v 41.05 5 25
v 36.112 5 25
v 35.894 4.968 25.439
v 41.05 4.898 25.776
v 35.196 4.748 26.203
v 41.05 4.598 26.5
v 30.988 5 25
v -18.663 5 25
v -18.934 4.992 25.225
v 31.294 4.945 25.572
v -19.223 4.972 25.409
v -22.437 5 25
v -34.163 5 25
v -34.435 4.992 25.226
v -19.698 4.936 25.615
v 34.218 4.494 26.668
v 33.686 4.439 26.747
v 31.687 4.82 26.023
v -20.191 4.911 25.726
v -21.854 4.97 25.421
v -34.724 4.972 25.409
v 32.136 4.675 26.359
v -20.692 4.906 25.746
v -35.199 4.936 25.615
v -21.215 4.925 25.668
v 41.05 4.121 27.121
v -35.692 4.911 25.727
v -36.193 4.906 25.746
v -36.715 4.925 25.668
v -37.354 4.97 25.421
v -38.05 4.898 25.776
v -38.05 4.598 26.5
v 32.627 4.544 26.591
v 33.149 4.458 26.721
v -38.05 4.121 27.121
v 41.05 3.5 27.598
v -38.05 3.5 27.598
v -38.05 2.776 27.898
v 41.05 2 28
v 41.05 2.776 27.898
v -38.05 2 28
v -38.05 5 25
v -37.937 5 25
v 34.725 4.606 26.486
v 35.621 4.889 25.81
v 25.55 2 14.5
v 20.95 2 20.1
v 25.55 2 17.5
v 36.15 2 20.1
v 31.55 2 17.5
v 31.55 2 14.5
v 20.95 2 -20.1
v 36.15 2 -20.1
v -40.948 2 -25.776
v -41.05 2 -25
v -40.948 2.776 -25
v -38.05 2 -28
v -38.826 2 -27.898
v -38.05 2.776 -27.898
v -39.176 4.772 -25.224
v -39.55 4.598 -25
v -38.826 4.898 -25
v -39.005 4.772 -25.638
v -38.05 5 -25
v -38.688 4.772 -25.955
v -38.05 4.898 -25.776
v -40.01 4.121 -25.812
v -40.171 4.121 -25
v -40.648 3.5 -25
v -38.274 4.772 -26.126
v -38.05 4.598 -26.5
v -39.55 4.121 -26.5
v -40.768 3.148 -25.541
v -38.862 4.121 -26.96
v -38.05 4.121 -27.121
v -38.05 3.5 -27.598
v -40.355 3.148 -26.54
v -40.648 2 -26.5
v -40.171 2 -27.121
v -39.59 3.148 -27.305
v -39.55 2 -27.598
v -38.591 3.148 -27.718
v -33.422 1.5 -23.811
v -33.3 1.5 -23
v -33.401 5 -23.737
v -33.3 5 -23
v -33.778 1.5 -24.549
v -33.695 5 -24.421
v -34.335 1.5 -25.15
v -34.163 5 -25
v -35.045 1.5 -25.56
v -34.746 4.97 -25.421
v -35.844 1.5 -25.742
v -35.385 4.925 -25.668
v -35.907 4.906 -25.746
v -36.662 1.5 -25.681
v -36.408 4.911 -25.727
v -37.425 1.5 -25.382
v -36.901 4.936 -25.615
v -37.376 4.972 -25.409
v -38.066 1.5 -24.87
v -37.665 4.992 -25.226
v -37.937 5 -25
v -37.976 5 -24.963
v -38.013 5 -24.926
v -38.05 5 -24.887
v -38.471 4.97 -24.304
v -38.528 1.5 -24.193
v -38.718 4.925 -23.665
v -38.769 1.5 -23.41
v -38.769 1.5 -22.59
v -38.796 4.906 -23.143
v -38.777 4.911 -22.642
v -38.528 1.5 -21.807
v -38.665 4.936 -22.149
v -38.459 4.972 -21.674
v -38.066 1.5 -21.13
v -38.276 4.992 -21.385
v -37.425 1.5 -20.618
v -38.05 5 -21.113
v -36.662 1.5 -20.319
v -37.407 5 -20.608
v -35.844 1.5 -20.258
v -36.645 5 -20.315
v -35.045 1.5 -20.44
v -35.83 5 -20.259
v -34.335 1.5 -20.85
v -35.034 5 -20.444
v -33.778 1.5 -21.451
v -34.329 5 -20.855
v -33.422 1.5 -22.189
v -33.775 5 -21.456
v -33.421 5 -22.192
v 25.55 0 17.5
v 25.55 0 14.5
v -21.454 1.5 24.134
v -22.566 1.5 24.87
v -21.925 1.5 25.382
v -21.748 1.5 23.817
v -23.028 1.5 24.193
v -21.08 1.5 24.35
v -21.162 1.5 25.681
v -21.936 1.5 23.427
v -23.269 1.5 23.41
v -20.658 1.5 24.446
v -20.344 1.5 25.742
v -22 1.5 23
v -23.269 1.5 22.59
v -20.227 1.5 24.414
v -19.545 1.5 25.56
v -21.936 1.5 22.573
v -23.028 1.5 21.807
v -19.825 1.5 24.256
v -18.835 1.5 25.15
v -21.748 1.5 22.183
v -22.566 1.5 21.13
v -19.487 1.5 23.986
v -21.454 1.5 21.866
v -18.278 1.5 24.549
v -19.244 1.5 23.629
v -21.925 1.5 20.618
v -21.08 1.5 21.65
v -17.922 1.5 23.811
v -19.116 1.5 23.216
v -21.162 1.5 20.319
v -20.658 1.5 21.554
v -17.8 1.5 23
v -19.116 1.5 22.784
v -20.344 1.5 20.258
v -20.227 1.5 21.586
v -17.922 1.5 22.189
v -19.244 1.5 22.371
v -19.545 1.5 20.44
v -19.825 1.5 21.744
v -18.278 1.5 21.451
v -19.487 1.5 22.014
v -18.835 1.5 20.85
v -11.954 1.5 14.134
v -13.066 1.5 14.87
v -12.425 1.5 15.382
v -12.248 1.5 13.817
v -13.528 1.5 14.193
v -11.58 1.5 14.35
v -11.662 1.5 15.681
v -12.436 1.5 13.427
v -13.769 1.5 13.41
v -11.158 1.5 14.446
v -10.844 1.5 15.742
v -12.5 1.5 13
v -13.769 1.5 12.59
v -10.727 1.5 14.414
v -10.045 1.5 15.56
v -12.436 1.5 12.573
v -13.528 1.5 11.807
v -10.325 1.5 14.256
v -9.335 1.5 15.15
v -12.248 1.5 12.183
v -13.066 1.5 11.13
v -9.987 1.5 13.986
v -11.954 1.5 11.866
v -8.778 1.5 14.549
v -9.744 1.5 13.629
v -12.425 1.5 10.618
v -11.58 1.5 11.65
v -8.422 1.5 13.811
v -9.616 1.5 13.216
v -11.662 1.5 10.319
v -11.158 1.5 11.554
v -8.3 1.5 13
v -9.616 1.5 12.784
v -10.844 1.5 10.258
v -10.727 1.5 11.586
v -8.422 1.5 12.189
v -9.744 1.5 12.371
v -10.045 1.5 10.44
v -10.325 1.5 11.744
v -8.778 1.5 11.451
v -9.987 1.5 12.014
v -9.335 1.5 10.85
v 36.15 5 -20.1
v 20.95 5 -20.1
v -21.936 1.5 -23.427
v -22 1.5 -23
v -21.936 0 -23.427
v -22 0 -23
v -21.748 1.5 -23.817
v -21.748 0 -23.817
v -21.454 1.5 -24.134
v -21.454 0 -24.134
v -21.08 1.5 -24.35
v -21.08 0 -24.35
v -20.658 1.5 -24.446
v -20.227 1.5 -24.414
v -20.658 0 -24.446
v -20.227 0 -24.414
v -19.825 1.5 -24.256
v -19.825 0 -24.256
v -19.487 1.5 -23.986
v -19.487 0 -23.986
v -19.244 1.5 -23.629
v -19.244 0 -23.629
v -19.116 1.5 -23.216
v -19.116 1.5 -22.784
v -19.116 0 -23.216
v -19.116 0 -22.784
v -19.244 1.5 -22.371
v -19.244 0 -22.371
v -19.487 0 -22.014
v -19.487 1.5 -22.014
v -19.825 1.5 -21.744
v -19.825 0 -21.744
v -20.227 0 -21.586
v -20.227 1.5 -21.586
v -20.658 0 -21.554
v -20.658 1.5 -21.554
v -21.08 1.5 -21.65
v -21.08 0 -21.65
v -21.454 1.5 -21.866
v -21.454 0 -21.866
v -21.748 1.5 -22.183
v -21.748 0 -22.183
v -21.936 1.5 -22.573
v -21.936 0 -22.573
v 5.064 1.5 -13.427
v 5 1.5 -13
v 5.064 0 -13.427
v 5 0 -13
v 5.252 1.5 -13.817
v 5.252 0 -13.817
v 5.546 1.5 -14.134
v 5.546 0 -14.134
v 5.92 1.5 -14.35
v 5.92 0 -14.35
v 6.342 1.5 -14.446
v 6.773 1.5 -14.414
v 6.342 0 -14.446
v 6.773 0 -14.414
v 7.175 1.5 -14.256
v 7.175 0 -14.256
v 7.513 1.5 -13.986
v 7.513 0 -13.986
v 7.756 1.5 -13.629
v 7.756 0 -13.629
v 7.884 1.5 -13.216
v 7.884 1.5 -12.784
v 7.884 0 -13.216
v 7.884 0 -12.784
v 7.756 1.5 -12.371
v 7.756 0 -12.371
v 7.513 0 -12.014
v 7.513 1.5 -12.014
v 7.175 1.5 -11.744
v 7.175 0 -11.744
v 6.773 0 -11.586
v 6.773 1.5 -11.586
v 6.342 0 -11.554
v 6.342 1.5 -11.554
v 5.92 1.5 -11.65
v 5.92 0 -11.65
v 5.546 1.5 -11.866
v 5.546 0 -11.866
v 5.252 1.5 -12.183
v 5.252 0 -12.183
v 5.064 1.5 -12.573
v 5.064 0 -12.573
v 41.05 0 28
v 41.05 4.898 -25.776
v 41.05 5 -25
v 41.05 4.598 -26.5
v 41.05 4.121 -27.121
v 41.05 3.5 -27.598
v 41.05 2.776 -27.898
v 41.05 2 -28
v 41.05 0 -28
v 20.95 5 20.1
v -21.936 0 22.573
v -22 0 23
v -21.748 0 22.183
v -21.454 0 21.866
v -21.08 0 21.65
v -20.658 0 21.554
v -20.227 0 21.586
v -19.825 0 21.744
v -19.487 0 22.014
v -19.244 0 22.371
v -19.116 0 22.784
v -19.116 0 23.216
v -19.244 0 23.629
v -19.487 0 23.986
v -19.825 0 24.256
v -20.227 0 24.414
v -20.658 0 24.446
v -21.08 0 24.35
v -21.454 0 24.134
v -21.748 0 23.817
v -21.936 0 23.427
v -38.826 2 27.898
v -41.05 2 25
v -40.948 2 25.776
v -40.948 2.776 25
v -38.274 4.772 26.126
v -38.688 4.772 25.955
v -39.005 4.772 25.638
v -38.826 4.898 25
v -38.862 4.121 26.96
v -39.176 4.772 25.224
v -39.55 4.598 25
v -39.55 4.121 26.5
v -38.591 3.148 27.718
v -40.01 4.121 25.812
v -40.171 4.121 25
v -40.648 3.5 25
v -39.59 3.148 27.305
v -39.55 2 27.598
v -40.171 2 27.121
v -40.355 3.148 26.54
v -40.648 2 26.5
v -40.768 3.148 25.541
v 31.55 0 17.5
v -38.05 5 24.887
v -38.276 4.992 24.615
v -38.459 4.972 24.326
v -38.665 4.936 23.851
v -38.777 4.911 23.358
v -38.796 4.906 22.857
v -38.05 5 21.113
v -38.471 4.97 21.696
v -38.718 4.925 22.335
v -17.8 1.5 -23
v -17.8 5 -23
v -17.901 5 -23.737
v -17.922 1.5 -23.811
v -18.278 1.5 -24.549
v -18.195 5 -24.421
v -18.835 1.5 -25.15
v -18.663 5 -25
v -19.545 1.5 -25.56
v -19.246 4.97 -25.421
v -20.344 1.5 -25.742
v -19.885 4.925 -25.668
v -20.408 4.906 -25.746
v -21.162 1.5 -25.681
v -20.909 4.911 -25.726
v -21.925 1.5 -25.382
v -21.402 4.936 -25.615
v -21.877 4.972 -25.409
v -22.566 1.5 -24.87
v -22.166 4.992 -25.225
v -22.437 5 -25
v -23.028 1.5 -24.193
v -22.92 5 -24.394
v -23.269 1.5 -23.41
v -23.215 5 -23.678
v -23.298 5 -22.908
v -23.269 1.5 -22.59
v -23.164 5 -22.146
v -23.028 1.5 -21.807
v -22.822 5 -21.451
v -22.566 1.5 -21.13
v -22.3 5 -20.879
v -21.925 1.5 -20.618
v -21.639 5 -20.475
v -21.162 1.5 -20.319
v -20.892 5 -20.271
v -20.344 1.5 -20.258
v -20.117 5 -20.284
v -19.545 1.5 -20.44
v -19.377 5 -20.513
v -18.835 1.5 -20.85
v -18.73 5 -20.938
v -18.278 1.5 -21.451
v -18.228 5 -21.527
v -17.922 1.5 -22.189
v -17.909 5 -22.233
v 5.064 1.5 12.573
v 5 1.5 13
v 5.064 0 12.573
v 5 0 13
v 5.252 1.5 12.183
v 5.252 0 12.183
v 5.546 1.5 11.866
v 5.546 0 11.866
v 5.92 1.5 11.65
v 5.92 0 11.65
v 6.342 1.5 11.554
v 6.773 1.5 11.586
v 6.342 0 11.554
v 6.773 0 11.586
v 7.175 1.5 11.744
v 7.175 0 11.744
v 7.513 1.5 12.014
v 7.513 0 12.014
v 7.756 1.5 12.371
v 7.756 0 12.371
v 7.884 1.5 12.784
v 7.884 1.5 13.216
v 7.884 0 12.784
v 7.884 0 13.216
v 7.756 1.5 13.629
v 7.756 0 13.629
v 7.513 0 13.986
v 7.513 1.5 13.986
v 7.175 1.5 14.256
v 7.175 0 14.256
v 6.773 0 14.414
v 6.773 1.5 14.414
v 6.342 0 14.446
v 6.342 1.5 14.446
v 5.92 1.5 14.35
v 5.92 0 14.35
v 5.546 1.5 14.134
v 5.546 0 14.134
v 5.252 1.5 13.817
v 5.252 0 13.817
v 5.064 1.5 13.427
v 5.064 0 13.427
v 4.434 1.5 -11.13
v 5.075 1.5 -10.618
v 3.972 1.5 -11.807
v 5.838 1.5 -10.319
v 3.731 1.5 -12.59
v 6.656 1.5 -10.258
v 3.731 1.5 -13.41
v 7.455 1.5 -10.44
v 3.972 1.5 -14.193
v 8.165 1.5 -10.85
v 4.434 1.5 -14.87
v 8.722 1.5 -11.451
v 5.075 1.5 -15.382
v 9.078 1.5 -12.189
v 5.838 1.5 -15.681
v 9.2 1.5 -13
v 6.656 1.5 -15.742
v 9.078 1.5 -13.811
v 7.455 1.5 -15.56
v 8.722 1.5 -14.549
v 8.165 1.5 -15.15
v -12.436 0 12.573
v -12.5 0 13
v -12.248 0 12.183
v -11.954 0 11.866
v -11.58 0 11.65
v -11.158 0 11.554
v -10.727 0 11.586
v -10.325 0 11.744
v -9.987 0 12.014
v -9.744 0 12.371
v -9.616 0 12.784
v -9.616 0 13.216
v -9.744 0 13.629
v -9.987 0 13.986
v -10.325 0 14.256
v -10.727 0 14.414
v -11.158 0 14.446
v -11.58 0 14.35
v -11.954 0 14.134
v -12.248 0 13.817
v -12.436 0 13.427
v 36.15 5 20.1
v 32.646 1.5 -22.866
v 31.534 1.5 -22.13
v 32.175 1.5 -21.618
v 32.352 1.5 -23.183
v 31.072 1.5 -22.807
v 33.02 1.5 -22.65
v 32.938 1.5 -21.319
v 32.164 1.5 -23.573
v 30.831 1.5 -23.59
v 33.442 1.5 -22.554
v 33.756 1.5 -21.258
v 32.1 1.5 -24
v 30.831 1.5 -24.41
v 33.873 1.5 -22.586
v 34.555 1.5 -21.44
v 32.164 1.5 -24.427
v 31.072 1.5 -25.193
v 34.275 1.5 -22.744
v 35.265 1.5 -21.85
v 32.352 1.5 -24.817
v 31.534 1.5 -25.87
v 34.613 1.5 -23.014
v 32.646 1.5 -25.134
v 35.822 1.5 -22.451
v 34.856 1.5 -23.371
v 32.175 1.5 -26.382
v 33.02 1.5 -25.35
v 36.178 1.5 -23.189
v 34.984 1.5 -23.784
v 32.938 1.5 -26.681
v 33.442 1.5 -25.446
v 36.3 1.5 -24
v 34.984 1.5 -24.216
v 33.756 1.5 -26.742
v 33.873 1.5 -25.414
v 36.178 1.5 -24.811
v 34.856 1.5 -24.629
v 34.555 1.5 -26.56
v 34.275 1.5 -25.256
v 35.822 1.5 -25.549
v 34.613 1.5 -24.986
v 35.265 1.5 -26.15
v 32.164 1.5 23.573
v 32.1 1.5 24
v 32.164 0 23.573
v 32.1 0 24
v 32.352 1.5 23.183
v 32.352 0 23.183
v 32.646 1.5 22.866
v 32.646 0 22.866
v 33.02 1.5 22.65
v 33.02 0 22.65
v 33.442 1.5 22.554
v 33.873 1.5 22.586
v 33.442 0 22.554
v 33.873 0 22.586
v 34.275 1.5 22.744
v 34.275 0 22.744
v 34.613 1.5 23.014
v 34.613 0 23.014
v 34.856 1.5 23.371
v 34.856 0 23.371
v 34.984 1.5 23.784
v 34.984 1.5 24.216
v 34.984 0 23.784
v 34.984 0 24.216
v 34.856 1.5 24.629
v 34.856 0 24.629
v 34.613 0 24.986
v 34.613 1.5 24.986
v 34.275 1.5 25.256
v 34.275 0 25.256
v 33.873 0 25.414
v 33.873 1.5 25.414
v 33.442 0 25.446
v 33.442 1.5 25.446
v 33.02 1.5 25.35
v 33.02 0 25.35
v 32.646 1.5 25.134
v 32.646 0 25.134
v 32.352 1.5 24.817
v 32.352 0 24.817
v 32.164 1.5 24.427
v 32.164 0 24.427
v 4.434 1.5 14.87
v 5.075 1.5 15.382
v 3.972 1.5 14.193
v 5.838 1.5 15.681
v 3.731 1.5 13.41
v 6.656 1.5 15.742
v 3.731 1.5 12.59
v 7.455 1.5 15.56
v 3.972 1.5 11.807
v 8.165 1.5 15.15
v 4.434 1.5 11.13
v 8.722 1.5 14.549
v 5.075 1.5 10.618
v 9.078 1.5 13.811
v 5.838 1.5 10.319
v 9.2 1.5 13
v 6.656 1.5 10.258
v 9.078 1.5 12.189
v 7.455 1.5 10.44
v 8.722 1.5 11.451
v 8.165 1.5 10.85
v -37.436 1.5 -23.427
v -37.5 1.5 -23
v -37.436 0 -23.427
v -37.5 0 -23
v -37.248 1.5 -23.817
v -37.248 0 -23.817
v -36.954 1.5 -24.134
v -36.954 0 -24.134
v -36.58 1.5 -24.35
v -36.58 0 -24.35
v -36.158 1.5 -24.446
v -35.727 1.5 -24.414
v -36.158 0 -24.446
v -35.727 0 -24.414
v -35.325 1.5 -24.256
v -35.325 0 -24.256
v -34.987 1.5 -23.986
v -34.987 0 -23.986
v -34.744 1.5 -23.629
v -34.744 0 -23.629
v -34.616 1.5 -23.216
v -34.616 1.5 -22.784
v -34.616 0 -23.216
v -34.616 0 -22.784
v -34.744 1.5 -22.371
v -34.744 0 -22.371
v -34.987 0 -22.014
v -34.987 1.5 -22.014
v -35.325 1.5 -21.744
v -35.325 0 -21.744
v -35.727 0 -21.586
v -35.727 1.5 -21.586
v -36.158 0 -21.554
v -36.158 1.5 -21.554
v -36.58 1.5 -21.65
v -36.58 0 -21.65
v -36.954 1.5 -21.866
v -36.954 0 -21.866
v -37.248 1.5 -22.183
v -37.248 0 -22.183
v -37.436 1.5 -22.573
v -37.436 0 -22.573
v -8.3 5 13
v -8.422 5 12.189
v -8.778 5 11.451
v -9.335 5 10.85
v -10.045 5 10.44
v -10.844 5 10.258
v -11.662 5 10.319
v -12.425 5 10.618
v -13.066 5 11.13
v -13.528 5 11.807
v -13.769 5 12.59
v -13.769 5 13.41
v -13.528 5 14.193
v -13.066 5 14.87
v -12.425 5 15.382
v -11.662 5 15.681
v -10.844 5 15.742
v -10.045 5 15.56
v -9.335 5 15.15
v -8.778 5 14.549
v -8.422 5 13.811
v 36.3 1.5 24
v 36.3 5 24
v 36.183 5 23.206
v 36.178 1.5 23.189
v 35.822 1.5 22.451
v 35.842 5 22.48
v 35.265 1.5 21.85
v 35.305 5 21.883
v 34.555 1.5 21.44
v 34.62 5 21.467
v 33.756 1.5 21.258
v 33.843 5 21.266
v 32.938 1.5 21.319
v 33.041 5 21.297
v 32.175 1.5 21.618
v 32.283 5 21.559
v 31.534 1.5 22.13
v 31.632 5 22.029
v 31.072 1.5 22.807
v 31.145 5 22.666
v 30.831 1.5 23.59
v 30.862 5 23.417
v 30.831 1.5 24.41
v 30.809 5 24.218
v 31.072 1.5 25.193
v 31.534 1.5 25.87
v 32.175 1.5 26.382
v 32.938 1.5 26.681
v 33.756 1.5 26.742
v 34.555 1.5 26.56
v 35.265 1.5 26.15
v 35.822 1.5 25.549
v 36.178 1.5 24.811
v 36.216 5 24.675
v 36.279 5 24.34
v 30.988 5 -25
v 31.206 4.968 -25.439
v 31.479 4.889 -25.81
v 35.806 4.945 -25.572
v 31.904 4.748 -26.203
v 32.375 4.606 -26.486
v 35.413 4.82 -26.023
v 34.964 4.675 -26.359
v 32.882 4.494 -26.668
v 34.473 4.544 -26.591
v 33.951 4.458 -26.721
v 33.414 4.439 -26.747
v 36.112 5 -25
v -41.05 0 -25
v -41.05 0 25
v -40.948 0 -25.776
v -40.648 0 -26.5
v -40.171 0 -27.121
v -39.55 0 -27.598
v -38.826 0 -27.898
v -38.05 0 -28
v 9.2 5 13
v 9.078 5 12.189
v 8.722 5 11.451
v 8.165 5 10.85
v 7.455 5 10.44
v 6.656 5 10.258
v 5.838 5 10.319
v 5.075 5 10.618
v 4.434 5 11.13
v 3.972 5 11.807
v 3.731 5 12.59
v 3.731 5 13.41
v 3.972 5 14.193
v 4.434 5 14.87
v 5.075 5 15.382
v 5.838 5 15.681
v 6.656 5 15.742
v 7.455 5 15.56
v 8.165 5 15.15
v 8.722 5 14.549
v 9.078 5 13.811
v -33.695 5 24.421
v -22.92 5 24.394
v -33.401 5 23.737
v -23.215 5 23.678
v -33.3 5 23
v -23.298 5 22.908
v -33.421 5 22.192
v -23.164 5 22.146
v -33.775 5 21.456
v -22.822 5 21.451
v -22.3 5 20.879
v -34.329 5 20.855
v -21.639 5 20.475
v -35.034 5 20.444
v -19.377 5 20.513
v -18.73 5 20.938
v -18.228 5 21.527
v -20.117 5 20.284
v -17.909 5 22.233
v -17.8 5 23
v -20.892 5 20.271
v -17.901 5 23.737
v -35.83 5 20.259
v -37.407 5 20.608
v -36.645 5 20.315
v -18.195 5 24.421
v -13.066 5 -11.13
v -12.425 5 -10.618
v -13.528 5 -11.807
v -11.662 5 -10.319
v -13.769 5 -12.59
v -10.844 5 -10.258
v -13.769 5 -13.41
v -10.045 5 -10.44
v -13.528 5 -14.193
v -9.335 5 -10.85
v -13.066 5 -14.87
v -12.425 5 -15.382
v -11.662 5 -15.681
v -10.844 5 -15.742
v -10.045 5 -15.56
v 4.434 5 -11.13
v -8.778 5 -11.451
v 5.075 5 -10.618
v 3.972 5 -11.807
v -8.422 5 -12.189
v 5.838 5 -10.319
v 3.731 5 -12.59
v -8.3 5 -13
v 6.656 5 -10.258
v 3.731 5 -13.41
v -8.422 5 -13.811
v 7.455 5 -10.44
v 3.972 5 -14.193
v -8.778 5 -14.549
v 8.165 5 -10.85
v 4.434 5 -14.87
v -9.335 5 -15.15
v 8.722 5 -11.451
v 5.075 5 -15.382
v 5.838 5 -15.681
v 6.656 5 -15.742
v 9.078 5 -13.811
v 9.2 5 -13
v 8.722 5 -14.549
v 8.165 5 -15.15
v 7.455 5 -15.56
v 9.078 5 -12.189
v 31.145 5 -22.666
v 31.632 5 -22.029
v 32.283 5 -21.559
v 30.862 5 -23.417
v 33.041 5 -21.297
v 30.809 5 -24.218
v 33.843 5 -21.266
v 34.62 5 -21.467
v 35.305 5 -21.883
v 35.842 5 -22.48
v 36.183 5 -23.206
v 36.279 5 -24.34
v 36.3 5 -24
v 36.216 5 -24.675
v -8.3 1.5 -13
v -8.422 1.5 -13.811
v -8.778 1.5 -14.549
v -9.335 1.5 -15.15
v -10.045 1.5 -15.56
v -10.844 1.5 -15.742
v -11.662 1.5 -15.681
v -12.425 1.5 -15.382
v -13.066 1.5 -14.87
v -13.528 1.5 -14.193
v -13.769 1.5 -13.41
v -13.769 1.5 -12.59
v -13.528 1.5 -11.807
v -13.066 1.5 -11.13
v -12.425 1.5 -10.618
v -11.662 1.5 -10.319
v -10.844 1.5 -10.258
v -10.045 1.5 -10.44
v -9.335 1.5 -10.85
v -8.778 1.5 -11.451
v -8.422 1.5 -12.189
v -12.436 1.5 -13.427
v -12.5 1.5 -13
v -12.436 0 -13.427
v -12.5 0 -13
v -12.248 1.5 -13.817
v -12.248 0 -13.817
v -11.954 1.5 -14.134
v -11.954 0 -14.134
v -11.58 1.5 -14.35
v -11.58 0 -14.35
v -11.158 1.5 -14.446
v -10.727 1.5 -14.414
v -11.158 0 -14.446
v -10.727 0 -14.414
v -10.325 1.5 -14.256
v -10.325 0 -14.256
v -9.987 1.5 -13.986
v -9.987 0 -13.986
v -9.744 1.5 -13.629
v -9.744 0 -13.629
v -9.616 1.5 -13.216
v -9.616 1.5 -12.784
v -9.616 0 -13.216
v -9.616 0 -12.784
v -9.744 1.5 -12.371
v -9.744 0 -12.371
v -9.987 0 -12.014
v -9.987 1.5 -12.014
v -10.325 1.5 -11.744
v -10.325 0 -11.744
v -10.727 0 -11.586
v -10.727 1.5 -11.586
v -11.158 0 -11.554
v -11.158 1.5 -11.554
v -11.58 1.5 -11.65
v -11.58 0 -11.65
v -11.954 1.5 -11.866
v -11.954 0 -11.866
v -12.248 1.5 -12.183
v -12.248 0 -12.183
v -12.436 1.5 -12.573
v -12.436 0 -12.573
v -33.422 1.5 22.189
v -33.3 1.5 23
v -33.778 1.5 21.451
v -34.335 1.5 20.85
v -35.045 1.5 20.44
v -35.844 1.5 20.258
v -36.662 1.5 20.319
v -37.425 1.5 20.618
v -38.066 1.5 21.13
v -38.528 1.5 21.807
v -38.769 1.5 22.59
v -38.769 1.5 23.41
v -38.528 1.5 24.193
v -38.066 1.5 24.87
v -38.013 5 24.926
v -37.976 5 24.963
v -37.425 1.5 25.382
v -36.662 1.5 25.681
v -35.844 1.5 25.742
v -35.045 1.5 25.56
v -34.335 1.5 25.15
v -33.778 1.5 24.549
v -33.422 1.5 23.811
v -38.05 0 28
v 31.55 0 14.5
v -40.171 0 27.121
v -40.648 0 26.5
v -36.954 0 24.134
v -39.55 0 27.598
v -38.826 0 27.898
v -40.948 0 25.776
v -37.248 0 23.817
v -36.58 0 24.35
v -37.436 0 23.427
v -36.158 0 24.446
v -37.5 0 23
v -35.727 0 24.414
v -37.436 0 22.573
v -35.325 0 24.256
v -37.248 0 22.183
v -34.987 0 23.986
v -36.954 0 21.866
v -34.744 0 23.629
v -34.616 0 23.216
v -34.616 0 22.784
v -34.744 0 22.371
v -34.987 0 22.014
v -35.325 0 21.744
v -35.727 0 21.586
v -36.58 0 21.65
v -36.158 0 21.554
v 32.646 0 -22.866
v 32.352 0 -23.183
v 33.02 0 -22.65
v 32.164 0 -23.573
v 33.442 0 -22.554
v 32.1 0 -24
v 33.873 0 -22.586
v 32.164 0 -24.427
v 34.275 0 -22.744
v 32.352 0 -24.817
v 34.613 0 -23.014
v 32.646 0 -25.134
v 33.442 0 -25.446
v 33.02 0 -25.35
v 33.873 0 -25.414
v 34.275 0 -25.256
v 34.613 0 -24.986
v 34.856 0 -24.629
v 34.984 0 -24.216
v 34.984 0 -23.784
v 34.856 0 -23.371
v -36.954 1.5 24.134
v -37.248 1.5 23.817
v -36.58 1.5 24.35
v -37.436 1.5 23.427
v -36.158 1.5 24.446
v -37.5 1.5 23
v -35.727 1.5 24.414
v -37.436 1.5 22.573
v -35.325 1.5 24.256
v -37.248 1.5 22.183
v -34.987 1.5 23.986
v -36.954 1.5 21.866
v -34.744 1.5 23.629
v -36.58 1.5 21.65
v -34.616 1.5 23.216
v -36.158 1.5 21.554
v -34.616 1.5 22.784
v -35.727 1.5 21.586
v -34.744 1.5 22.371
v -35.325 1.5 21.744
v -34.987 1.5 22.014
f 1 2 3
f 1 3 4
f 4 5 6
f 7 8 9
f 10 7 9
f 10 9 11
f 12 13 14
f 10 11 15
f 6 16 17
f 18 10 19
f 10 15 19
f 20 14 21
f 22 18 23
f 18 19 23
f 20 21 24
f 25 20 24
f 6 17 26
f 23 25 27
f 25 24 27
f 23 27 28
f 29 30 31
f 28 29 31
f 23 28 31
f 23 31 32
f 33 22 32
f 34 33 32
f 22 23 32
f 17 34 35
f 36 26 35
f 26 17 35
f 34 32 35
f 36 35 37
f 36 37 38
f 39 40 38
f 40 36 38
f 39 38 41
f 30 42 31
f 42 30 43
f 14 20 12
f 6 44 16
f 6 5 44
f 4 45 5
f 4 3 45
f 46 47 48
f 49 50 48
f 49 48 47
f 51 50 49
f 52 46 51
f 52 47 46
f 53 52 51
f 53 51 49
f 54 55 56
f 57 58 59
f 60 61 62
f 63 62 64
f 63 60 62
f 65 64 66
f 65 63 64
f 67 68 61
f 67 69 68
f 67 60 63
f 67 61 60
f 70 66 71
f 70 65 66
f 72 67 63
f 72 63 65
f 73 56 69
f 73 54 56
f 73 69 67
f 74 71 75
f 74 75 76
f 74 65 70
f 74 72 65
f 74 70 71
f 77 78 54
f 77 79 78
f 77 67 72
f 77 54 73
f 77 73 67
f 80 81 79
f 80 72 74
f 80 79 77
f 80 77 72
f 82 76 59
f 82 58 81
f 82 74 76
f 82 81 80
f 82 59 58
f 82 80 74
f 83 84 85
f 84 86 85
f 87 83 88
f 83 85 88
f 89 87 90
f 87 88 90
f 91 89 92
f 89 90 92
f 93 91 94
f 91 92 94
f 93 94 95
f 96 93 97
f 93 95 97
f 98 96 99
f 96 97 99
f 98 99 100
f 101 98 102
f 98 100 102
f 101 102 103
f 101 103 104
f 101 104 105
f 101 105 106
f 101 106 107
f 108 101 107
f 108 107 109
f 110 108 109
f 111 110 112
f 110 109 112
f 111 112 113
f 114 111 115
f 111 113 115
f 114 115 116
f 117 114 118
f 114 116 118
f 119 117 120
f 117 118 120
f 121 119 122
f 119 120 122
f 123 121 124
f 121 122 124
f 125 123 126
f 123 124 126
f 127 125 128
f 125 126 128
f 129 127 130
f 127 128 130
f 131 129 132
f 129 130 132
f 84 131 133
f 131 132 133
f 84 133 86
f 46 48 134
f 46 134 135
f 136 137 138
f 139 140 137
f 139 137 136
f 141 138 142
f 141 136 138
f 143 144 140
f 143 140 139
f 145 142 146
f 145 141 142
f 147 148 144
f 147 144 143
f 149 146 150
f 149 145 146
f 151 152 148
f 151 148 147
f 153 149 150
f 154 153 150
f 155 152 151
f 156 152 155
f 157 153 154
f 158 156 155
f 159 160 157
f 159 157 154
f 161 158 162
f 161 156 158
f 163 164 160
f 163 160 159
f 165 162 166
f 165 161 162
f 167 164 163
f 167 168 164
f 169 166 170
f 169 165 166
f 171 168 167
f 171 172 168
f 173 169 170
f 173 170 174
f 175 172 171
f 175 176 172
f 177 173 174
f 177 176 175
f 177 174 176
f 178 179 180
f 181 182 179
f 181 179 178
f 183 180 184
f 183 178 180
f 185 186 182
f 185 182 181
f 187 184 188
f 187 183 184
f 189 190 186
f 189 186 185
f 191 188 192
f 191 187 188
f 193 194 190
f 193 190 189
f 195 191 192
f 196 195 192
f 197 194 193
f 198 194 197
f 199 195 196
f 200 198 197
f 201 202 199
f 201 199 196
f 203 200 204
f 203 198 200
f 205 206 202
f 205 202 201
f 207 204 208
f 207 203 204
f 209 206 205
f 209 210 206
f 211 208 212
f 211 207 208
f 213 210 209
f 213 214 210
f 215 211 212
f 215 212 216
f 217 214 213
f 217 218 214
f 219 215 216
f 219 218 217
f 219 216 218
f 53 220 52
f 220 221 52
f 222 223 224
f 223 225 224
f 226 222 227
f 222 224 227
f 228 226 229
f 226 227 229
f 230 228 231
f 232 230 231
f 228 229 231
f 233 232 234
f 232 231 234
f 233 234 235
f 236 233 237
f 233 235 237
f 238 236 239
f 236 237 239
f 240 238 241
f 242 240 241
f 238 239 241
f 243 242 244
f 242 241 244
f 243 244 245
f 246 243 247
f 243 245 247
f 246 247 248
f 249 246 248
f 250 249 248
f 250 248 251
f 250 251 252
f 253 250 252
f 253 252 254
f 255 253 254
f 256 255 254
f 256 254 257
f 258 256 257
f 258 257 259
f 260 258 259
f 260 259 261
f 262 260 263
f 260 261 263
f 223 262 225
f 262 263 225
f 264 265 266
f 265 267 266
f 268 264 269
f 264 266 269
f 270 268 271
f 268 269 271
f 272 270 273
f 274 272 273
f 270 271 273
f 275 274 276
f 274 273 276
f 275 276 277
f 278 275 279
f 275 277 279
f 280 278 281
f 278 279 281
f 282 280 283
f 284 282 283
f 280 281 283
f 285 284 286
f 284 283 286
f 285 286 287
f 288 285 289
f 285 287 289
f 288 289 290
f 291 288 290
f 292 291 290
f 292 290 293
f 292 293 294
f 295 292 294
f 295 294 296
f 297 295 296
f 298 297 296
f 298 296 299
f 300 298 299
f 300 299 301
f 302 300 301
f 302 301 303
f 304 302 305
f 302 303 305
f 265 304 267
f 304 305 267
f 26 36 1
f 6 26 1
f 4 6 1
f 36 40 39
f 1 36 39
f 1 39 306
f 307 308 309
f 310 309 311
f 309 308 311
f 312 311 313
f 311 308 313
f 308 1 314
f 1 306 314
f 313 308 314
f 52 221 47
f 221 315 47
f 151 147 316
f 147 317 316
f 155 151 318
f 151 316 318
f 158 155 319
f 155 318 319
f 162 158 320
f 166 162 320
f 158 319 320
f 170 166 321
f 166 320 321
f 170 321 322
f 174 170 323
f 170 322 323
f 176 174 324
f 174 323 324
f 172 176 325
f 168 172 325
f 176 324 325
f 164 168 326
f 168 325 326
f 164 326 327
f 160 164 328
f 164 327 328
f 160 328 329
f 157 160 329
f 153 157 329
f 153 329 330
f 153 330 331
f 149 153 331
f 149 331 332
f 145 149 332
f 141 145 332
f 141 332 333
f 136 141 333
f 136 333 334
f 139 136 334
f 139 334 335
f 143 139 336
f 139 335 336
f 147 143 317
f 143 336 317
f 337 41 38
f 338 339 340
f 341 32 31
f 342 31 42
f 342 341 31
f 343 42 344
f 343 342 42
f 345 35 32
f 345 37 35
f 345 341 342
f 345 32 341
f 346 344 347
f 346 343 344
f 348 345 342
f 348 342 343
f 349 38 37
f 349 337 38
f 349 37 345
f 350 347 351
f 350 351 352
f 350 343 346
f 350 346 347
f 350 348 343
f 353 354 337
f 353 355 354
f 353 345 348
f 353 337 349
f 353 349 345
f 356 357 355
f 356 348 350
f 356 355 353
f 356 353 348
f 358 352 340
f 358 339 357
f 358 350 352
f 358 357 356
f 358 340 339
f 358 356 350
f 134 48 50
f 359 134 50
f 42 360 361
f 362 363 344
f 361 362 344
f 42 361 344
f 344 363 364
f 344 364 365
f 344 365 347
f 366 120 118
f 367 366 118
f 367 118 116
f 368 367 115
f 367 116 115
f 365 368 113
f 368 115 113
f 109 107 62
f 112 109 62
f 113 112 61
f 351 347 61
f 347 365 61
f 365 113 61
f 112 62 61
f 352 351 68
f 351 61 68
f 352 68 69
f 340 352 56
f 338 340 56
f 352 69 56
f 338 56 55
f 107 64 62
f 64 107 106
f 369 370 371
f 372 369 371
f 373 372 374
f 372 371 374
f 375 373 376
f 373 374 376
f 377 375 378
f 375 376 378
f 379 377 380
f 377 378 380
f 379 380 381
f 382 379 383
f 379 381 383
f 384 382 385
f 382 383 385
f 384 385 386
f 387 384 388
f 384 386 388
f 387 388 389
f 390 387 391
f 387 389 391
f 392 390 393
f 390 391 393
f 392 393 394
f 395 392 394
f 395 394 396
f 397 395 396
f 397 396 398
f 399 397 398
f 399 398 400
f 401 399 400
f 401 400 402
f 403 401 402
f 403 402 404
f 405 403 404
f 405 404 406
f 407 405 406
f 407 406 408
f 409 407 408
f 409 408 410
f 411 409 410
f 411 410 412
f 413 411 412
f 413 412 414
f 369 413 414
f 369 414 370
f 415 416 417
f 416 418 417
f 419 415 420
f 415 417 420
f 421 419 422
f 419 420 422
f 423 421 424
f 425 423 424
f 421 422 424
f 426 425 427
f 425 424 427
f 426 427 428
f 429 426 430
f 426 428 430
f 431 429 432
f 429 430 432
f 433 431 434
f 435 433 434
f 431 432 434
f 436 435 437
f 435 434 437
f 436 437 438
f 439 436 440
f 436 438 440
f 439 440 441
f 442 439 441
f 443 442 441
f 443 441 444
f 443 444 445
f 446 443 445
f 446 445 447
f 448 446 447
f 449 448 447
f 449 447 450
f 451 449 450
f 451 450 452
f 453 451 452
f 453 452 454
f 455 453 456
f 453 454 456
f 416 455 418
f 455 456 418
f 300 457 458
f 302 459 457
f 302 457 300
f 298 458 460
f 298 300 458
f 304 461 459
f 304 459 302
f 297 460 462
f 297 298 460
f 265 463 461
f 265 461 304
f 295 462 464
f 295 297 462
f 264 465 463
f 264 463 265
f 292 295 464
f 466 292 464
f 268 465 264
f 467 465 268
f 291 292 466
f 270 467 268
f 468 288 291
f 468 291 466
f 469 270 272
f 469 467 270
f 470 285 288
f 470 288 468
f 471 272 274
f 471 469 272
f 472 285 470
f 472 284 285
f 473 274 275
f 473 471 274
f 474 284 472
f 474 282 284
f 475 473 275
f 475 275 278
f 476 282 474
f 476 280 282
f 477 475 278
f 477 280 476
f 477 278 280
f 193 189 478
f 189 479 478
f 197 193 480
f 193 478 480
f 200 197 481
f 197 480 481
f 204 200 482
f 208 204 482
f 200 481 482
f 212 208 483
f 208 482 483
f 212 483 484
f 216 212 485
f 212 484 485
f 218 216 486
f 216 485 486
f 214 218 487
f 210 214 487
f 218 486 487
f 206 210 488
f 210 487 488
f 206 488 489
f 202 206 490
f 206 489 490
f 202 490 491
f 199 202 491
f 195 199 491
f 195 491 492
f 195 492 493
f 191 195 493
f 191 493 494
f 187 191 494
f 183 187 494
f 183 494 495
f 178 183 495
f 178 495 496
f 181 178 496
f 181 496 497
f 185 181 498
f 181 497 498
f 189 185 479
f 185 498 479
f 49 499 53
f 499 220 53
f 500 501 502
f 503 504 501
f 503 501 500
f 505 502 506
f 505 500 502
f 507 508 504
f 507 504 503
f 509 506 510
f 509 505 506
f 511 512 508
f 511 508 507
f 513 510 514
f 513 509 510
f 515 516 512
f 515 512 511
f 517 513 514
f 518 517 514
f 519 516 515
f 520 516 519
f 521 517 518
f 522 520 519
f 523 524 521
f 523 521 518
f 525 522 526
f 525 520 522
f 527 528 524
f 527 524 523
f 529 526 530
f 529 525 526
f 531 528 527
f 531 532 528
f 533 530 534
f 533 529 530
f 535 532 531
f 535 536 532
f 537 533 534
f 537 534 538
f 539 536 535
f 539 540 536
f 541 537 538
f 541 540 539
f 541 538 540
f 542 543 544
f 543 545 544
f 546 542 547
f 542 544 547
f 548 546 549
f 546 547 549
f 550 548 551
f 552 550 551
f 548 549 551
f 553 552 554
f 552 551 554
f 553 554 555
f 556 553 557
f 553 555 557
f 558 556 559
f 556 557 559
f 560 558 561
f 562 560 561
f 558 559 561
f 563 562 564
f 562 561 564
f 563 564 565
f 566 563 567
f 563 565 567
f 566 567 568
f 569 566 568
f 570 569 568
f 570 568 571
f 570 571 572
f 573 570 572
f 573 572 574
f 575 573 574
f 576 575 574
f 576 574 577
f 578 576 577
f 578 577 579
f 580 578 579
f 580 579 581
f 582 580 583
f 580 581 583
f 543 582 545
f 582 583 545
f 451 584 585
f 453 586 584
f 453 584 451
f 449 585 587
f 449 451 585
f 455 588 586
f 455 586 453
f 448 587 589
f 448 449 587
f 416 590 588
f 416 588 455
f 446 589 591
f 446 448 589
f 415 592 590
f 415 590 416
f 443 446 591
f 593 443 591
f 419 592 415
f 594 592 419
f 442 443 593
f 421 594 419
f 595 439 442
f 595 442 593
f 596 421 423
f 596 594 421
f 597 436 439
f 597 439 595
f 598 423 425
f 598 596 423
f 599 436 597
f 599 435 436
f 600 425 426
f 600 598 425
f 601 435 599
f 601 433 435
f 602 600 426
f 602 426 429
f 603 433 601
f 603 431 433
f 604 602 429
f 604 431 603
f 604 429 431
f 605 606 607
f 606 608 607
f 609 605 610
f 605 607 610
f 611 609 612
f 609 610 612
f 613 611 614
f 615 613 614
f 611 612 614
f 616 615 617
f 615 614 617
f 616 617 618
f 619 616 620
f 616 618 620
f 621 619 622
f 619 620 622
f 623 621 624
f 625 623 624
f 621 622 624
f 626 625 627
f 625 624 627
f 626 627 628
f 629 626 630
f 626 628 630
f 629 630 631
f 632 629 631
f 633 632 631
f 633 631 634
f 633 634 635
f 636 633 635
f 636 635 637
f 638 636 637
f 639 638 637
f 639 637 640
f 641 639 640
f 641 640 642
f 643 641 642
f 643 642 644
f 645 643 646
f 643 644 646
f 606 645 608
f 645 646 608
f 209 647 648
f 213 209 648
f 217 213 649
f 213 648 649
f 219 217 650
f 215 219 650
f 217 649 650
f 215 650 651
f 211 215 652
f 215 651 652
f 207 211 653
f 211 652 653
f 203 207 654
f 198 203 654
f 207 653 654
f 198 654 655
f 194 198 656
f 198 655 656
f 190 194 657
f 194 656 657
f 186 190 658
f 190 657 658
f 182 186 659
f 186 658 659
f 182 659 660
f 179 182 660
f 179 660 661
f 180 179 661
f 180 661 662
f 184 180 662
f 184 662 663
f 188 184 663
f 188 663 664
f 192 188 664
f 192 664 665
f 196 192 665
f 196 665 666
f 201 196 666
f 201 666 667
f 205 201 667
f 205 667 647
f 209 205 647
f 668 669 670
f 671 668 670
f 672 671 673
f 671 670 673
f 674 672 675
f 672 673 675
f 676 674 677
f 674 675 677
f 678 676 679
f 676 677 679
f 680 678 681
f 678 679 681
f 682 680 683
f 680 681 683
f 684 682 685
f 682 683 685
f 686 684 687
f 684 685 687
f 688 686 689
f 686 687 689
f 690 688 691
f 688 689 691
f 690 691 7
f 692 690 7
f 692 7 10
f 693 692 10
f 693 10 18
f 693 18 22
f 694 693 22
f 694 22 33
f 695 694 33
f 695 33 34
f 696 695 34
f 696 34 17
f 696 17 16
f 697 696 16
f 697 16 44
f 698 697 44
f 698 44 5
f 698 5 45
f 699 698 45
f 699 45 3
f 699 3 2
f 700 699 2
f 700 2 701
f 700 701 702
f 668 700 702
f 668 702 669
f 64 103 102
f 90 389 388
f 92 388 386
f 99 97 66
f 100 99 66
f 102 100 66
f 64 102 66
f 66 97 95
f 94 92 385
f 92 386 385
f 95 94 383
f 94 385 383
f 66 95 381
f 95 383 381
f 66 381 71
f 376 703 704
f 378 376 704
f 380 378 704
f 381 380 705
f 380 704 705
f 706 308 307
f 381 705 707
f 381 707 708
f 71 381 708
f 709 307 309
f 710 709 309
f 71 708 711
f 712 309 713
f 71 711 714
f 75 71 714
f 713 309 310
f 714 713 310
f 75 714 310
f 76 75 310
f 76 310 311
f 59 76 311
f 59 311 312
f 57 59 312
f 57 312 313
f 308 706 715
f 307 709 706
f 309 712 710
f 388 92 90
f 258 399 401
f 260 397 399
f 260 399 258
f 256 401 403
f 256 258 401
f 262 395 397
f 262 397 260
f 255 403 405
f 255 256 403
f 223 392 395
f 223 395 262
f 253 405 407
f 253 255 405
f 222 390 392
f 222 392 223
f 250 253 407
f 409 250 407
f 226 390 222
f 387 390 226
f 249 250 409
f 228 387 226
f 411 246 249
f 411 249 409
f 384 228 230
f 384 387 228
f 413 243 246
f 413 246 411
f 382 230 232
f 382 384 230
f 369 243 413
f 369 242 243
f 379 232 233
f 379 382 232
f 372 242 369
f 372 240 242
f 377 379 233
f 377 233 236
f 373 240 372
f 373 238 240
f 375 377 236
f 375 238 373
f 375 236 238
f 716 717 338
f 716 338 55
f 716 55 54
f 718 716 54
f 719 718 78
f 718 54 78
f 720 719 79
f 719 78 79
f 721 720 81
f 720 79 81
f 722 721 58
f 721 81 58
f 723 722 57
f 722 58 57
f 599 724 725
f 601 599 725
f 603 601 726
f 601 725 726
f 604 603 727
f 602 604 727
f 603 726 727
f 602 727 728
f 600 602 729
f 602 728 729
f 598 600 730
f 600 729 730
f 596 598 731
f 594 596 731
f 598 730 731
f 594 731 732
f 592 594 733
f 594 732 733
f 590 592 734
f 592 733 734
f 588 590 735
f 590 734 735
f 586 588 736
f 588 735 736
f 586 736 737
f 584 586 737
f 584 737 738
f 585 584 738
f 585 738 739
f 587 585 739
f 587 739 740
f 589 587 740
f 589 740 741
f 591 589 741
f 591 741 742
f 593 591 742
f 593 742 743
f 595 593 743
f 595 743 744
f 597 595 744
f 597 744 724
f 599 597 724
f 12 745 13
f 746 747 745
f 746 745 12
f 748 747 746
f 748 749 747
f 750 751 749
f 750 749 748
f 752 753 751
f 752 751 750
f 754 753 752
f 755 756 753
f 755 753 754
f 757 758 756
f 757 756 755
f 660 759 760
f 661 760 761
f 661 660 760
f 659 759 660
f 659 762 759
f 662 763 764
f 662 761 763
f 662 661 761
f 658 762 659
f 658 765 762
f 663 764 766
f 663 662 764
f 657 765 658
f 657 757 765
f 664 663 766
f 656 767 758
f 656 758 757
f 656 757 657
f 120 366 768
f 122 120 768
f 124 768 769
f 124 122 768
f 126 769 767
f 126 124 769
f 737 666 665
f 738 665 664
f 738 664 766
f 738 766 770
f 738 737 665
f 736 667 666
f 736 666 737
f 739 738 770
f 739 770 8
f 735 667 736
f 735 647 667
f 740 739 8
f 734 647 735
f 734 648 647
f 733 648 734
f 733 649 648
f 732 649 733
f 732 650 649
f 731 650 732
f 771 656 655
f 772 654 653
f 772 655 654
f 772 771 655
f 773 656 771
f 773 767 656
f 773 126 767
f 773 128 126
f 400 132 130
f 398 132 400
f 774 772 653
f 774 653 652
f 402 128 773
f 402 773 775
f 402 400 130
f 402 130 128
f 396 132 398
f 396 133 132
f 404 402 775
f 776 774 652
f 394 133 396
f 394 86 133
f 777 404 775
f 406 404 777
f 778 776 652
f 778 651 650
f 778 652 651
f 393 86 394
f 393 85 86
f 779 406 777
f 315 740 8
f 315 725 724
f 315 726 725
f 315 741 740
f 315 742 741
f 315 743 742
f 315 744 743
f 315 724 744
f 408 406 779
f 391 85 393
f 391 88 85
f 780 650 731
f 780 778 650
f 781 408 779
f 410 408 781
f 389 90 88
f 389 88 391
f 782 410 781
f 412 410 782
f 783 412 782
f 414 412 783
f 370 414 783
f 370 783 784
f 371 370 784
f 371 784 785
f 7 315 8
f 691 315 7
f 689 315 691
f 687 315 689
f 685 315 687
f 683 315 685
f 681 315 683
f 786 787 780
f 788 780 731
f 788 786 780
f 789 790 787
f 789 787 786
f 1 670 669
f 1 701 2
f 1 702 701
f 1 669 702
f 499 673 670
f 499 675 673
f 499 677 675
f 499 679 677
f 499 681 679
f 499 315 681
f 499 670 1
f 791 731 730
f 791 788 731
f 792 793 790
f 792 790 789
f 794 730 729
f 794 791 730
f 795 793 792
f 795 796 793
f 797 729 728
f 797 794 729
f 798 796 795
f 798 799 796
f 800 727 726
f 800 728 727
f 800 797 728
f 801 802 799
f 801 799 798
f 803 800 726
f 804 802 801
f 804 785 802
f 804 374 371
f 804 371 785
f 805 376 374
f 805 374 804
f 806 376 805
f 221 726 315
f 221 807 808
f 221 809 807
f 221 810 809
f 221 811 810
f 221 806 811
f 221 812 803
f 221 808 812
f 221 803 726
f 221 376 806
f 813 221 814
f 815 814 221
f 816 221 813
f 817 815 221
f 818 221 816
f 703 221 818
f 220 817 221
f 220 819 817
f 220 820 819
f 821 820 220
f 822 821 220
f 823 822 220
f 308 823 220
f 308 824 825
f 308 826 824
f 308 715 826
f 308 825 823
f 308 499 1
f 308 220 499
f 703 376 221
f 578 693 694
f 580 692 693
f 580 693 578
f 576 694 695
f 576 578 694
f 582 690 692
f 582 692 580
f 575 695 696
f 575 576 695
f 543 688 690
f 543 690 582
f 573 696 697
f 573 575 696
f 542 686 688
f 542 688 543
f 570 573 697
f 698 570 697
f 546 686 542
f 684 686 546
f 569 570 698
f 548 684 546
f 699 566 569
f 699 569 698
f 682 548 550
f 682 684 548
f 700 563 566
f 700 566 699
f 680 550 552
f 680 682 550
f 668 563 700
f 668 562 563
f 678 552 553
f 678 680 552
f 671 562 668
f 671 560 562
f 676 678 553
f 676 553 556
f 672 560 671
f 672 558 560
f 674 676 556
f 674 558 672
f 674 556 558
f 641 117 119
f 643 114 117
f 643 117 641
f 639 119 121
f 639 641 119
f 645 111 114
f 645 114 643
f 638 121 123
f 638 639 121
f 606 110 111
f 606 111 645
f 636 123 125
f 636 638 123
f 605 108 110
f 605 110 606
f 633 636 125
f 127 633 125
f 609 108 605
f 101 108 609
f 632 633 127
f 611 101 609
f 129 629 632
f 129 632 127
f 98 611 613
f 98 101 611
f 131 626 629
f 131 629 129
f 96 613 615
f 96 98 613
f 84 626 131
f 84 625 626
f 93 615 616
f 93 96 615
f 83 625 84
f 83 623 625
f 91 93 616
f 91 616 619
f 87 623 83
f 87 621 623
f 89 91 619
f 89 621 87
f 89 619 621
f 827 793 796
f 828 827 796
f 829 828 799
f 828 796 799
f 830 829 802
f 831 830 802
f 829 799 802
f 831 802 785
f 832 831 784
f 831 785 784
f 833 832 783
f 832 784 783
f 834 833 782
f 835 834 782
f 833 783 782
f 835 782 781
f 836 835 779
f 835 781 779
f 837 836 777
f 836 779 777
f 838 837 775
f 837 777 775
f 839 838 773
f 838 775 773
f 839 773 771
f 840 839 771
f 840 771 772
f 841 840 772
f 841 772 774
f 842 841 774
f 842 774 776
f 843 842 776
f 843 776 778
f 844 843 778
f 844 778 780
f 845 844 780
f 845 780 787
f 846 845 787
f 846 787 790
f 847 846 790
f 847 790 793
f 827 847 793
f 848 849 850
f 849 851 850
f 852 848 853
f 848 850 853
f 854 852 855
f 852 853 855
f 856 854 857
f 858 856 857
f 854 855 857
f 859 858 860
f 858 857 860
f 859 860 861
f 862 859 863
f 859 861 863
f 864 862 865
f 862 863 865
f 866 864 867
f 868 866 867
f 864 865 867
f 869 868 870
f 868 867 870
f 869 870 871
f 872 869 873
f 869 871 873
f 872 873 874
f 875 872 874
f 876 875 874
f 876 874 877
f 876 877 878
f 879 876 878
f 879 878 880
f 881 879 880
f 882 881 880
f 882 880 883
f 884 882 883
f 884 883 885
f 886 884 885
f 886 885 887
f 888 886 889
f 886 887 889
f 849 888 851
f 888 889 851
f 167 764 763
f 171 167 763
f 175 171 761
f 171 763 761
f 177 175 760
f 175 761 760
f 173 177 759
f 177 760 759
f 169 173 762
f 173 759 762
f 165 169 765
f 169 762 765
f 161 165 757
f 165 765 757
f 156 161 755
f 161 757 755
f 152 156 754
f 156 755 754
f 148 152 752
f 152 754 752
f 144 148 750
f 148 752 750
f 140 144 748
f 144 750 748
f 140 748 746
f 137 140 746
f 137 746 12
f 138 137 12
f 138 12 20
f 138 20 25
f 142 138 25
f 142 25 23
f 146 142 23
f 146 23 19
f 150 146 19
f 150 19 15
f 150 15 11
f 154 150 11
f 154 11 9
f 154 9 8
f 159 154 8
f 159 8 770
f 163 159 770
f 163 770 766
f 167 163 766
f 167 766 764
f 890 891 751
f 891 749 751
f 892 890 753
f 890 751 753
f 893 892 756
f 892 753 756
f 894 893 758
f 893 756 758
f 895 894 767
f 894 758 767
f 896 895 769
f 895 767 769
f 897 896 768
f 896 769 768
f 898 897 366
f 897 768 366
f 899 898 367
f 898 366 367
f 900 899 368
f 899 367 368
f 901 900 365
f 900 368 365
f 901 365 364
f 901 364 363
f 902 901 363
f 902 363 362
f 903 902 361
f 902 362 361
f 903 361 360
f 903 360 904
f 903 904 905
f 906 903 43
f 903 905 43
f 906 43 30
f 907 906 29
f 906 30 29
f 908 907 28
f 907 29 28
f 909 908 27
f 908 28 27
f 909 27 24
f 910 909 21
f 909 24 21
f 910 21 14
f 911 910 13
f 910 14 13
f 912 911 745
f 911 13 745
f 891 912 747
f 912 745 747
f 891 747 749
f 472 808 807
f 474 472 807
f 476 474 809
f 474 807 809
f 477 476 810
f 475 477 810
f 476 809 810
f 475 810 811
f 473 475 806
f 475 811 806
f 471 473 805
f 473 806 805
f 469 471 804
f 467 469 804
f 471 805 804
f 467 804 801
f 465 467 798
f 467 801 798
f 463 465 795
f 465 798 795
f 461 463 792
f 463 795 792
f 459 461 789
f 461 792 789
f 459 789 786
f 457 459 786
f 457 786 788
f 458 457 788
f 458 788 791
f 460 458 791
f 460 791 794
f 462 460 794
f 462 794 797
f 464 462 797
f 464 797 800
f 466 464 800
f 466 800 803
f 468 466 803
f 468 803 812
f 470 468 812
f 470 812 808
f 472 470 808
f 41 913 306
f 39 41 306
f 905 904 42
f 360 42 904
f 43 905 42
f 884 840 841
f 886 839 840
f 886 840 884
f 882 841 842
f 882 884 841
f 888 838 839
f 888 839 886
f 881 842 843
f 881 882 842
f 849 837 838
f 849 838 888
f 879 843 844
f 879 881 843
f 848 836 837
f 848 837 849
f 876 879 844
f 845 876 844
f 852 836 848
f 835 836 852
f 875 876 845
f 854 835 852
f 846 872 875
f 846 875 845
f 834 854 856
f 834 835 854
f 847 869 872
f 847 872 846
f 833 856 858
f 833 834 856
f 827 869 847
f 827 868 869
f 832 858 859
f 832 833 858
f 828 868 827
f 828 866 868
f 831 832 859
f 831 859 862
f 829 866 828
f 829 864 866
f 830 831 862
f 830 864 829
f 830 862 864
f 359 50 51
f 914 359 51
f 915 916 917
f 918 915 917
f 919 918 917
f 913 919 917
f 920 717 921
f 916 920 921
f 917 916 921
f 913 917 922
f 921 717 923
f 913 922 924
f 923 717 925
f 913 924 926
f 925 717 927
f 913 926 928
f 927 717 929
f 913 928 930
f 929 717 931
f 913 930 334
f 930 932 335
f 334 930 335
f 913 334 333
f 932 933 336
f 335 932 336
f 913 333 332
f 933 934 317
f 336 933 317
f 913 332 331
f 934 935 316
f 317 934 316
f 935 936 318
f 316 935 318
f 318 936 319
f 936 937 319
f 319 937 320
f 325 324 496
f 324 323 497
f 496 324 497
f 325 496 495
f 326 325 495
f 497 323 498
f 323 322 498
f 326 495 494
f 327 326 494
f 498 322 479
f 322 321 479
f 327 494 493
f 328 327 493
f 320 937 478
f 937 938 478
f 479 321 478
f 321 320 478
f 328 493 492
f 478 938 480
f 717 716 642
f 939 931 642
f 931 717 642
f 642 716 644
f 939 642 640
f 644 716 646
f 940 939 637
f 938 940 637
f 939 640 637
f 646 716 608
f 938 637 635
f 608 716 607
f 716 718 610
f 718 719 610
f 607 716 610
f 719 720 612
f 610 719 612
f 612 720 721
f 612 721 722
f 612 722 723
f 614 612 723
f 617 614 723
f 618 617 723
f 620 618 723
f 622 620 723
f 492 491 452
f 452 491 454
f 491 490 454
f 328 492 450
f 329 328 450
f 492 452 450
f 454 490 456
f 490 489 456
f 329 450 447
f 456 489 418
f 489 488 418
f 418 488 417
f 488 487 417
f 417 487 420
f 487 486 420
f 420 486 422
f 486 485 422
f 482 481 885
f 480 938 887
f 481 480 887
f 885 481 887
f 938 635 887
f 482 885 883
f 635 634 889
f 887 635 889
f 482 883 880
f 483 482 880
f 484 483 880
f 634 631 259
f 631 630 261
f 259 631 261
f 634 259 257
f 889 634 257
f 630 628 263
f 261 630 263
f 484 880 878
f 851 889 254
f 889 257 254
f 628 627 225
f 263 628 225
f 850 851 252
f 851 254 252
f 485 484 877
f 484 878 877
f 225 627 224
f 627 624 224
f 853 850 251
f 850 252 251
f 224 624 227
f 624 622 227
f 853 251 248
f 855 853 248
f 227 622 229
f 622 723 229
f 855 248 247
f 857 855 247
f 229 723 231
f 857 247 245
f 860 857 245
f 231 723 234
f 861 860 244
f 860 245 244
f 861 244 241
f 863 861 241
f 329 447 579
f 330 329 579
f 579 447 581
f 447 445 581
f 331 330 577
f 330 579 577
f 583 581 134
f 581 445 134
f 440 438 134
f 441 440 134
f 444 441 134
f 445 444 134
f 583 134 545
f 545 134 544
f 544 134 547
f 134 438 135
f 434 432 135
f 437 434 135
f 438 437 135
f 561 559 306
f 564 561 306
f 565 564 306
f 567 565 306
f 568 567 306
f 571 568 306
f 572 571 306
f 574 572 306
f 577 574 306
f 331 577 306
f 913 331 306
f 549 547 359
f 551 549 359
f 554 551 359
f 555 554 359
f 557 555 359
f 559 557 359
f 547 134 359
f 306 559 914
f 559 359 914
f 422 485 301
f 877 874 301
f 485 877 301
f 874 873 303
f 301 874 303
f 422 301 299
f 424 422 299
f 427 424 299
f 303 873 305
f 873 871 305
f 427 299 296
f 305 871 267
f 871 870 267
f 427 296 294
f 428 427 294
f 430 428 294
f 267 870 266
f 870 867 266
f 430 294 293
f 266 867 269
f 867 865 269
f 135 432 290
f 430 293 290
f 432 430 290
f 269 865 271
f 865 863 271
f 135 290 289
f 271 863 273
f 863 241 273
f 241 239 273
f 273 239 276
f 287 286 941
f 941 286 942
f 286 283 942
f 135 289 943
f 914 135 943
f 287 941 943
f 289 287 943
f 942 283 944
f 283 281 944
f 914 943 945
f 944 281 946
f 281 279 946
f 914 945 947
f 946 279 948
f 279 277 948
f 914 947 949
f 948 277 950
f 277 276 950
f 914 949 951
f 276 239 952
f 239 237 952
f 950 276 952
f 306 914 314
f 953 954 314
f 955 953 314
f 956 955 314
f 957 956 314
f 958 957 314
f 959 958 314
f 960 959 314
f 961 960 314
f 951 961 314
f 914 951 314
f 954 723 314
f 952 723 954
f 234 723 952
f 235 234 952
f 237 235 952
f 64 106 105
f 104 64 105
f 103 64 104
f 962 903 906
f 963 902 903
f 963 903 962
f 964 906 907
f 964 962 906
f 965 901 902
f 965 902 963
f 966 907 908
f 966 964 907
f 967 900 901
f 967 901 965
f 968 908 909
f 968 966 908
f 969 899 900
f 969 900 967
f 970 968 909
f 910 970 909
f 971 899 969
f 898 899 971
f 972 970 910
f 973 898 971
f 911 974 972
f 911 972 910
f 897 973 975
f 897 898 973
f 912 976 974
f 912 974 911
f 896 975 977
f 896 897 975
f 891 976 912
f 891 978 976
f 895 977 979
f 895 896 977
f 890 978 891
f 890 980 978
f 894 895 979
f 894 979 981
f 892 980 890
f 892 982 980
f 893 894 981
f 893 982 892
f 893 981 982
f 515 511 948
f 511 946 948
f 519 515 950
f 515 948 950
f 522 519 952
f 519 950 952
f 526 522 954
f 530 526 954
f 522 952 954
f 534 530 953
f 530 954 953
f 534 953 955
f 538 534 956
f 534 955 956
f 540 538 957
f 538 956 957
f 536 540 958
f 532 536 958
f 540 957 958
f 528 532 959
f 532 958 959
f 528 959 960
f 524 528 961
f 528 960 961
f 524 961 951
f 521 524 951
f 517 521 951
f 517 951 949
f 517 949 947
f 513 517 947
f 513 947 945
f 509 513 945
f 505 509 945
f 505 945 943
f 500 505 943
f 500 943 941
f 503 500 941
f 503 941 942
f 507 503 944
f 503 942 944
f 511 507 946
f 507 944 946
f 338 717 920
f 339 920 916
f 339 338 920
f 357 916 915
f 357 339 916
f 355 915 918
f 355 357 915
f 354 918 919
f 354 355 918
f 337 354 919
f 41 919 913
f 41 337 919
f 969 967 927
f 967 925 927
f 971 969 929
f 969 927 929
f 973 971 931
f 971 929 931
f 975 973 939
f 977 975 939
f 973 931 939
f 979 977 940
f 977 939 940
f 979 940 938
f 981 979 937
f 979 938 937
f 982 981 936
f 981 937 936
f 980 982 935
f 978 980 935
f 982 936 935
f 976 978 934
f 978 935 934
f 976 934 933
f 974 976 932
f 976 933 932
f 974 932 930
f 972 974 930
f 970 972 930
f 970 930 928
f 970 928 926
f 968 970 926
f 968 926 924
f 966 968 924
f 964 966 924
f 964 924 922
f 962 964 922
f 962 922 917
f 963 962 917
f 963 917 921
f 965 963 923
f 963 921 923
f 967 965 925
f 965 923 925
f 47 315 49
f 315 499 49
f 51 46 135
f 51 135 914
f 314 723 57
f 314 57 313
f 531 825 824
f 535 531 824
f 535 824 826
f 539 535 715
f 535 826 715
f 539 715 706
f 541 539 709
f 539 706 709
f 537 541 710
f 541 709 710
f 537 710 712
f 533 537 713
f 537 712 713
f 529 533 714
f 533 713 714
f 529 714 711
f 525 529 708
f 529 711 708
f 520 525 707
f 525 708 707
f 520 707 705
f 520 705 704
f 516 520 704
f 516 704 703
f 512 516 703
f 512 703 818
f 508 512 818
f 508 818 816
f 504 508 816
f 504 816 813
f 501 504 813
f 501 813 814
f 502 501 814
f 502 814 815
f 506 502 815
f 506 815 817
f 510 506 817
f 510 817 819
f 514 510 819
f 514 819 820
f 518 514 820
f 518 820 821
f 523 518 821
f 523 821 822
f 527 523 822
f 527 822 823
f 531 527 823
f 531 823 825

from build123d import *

# Parameters (mm, degrees)
SKETCH1_W                        = 82.1
SKETCH1_H                        = 56
BOSS_EXTRUDE1_DEPTH              = 5
CBORE_FOR_M2_5_SHCS1_D           = 2.9
CBORE_FOR_M2_5_SHCS1_CBORE_D     = 5.5
CBORE_FOR_M2_5_SHCS1_CBORE_DEPTH = 3.5
FILLET1_R                        = 3
FILLET2_R                        = 3
SKETCH4_W                        = 15
SKETCH4_H                        = 40
CUT_EXTRUDE1_DEPTH               = 3
SKETCH5_W                        = 6
SKETCH5_H                        = 3
CUT_EXTRUDE2_DEPTH               = 50.780543533
MOVE_FACE1_BY                    = 0.1
MOVE_FACE1_2_BY                  = 0.1
MOVE_FACE1_3_BY                  = 0.1
MOVE_FACE1_4_BY                  = 0.1


with BuildPart() as part:
    # Sketch1 → Boss-Extrude1 (new body)
    with BuildSketch(Plane(origin=(0, 0, 0), x_dir=(1, 0, 0), z_dir=(0, 1, 0))):
        Rectangle(SKETCH1_W, SKETCH1_H)
    extrude(amount=BOSS_EXTRUDE1_DEPTH)

    # CBORE for M2.5 SHCS1 (through all)
    with Locations(Plane(origin=(0, 5, 0), x_dir=(1, 0, 0), z_dir=(0, 1, 0))):
        with Locations((-36.05, 23), (-36.05, -23), (-20.55, -23), (-20.55, 23), (-11.05, -13), (-11.05, 13), (6.45, 13), (6.45, -13), (33.55, 24), (33.55, -24)):
            CounterBoreHole(CBORE_FOR_M2_5_SHCS1_D / 2, CBORE_FOR_M2_5_SHCS1_CBORE_D / 2, CBORE_FOR_M2_5_SHCS1_CBORE_DEPTH)

    # Fillet1
    fillet1_edges = [part.edges().sort_by_distance(p)[0] for p in [
        (-41.05, 2.5, 28),
        (-41.05, 2.5, -28),
    ]]
    fillet(fillet1_edges, radius=FILLET1_R)

    # Fillet2
    # the kernel refuses this fillet: 3 mm, written as the material it takes off along each edge
    with BuildSketch(Plane(origin=(-38.05, 5, 28), x_dir=(0, -1, 0), z_dir=(1, 0, 0))) as fillet2_piece_1:
        with BuildLine():
            CenterArc((FILLET2_R, FILLET2_R), FILLET2_R, 180, 90)
            Line((0, FILLET2_R), (0, 0))
            Line((0, 0), (FILLET2_R, 0))
        make_face()
    extrude(amount=86.6, mode=Mode.SUBTRACT)
    with BuildSketch(Plane(origin=(-38.05, 5, 25), x_dir=(0, 0, 1), z_dir=(1, 0, 0))) as fillet2_piece_2:
        with BuildLine():
            CenterArc((3 - FILLET2_R, FILLET2_R), FILLET2_R, 270, 90)
            Line((3 - FILLET2_R, 0), (3, 0))
            Line((3, 0), (3, FILLET2_R))
        make_face()
    revolve(axis=Axis((-38.05, 5, 25), (0, -1, 0)), revolution_arc=90, mode=Mode.SUBTRACT)
    with BuildSketch(Plane(origin=(-38.05, 5, -25), x_dir=(-1, 0, 0), z_dir=(0, 0, 1))) as fillet2_piece_3:
        with BuildLine():
            CenterArc((3 - FILLET2_R, FILLET2_R), FILLET2_R, 270, 90)
            Line((3, FILLET2_R), (3, 0))
            Line((3, 0), (3 - FILLET2_R, 0))
        make_face()
    revolve(axis=Axis((-38.05, 5, -25), (0, -1, 0)), revolution_arc=90, mode=Mode.SUBTRACT)
    with BuildSketch(Plane(origin=(48.55, 5, -28), x_dir=(0, 0, 1), z_dir=(-1, 0, 0))) as fillet2_piece_4:
        with BuildLine():
            CenterArc((FILLET2_R, -FILLET2_R), FILLET2_R, 90, 90)
            Line((0, -FILLET2_R), (0, 0))
            Line((0, 0), (FILLET2_R, 0))
        make_face()
    extrude(amount=86.6, mode=Mode.SUBTRACT)
    with BuildSketch(Plane(origin=(-41.05, 5, -25), x_dir=(1, 0, 0), z_dir=(0, 0, 1))) as fillet2_piece_5:
        with BuildLine():
            CenterArc((FILLET2_R, -FILLET2_R), FILLET2_R, 90, 90)
            Line((0, -FILLET2_R), (0, 0))
            Line((0, 0), (FILLET2_R, 0))
        make_face()
    extrude(amount=50, mode=Mode.SUBTRACT)

    # Sketch4 → Cut-Extrude1 (cut)
    with BuildSketch(Plane(origin=(0, 5, 0), x_dir=(1, 0, 0), z_dir=(0, 1, 0))):
        with Locations((28.55, 0)):
            Rectangle(SKETCH4_W, SKETCH4_H)
    extrude(amount=-CUT_EXTRUDE1_DEPTH, mode=Mode.SUBTRACT)

    # Sketch5 → Cut-Extrude2 (cut, through all)
    with BuildSketch(Plane(origin=(0, 2, 0), x_dir=(1, 0, 0), z_dir=(0, 1, 0))):
        with Locations((28.55, -16)):
            Rectangle(SKETCH5_W, SKETCH5_H)
    extrude(amount=-CUT_EXTRUDE2_DEPTH, mode=Mode.SUBTRACT)

    # Move Face1: a face moved inward by 0.1
    extrude(part.faces().sort_by_distance((28.55, 3.5, 20))[0], amount=MOVE_FACE1_BY, dir=(0, 0, 1), mode=Mode.SUBTRACT)

    # Move Face1 2: a face moved inward by 0.1
    extrude(part.faces().sort_by_distance((36.05, 3.5, 0))[0], amount=MOVE_FACE1_2_BY, dir=(1, 0, 0), mode=Mode.SUBTRACT)

    # Move Face1 3: a face moved inward by 0.1
    extrude(part.faces().sort_by_distance((28.55, 3.5, -20))[0], amount=MOVE_FACE1_3_BY, dir=(0, 0, -1), mode=Mode.SUBTRACT)

    # Move Face1 4: a face moved inward by 0.1
    extrude(part.faces().sort_by_distance((21.05, 3.5, 0))[0], amount=MOVE_FACE1_4_BY, dir=(-1, 0, 0), mode=Mode.SUBTRACT)


solid = part.part
